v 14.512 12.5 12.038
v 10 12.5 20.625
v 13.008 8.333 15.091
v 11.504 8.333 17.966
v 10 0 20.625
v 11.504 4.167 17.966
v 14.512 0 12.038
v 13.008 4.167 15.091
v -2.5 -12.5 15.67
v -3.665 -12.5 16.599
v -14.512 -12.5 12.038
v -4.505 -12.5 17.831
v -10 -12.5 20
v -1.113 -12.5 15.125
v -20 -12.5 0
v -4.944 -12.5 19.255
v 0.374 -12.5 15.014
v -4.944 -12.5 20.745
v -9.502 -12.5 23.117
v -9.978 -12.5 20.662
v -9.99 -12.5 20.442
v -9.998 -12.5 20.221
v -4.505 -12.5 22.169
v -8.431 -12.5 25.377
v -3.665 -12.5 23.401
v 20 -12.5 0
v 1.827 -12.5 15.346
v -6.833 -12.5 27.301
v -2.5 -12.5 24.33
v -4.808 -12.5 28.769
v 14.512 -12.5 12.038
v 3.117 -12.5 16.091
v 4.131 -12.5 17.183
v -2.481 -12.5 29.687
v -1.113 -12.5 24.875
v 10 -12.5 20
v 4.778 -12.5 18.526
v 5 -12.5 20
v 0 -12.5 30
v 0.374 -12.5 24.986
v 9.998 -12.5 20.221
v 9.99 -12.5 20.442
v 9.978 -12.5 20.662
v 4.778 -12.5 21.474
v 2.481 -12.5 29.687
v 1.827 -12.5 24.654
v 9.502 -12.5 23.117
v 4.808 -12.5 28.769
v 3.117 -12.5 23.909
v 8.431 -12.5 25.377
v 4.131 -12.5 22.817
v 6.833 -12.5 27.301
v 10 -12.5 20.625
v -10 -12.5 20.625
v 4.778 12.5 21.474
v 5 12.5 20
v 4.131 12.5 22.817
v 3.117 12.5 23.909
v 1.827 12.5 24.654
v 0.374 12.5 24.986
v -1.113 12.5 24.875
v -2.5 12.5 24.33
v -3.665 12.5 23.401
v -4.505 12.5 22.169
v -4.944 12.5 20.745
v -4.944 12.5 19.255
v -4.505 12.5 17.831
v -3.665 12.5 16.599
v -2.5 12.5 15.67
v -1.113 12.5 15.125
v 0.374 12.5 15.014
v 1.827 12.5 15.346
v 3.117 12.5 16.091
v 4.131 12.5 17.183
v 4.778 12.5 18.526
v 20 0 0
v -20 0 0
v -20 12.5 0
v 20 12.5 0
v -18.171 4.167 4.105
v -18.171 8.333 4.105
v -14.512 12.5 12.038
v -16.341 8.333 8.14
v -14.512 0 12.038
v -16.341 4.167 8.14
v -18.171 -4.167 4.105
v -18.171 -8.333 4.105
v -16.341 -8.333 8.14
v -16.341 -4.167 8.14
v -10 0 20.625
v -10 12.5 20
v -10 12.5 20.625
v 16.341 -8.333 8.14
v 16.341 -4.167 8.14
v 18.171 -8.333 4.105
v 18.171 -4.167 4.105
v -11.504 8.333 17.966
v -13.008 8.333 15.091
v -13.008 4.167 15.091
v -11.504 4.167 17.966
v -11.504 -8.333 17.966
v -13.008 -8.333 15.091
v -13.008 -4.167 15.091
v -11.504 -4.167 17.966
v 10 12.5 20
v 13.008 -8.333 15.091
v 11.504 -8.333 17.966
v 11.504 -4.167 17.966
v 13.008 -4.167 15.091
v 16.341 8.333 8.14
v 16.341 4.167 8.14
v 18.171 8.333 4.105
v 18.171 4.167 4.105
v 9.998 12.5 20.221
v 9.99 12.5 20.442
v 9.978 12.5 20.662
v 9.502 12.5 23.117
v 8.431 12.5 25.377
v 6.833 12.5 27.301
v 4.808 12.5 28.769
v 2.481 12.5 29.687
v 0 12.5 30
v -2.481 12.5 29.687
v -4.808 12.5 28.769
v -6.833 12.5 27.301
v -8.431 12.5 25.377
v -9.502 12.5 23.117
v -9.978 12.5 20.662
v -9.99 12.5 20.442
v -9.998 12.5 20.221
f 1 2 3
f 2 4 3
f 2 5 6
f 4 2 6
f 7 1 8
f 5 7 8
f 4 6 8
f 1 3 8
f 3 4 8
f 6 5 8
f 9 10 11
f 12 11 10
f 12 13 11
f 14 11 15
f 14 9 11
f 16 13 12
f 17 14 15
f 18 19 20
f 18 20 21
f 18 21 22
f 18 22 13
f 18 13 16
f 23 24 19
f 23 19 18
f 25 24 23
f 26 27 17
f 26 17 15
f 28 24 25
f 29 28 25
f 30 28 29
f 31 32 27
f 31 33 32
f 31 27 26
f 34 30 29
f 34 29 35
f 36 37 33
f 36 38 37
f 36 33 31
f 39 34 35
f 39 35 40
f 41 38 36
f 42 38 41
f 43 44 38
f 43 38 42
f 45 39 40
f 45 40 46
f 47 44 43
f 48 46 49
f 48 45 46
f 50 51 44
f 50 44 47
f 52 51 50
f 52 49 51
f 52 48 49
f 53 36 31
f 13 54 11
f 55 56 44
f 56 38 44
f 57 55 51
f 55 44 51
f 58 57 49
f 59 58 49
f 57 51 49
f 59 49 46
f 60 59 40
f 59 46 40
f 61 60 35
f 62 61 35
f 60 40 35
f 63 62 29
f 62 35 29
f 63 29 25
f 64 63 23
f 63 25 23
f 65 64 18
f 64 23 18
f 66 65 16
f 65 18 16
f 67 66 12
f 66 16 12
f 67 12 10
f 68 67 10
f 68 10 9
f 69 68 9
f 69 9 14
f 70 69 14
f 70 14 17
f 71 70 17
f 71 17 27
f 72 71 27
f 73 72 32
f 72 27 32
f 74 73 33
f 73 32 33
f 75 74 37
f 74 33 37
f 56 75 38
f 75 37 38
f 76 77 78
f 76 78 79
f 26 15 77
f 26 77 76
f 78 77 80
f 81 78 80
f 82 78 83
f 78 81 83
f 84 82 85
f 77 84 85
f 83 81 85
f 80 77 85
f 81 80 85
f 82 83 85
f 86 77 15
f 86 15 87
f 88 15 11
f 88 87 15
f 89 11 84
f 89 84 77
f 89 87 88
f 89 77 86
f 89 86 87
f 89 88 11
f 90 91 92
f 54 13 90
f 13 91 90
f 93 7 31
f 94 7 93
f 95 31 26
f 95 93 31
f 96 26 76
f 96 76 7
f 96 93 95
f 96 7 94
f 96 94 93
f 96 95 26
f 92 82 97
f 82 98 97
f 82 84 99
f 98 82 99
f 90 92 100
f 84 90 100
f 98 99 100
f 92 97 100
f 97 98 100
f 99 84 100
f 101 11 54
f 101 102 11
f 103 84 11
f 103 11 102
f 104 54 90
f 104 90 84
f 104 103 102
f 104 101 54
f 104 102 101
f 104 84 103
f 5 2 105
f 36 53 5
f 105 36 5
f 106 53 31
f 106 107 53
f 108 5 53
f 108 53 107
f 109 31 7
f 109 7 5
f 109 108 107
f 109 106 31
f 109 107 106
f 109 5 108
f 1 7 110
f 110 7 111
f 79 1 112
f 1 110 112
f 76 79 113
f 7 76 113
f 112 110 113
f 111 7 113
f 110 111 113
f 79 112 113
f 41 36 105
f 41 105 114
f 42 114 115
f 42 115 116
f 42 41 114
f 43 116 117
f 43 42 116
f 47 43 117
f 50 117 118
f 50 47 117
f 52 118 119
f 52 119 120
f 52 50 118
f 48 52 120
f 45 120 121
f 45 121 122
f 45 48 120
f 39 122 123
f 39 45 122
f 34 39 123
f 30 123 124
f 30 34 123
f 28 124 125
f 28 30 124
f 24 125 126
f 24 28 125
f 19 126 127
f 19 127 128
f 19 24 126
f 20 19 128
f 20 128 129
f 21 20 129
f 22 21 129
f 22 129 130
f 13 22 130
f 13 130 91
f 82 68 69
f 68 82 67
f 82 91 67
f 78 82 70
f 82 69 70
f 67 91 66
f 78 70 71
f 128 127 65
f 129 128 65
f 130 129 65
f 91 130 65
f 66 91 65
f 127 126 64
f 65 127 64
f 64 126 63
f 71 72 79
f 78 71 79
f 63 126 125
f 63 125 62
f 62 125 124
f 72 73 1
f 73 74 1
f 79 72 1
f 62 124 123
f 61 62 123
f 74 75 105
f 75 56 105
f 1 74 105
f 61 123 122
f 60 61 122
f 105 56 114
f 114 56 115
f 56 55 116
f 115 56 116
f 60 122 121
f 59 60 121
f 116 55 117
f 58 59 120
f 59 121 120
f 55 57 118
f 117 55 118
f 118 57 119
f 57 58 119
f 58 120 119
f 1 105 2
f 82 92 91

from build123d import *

# Parameters (mm, degrees)
F2_DEPTH = 12.5
F0_R     = 5
F3_DEPTH = 12.5


with BuildPart() as f2:
    # F1 (on Front) → F2 (new body, symmetric)
    with BuildSketch(Plane.XZ):
        with BuildLine():
            Line((-10, 0), (10, 0))
            Line((10, 0), (10, 12.0382448658))
            Line((10, 12.0382448658), (6.0506574175, 12.0382448658))
            ThreePointArc((6.0506574175, 12.0382448658), (0, 10), (-6.0506574175, 12.0382448658))
            Line((-6.0506574175, 12.0382448658), (-10, 12.0382448658))
            Line((-10, 12.0382448658), (-10, 0))
        make_face()
        with BuildLine():
            Line((10, 12.0382448658), (10, 0))
            Line((10, 0), (20, 0))
            add(Edge.make_bspline(
                [(14.5119228257, 12.0382448658), (16.3412818838, 8.2321157615), (18.1706409419, 4.1160578807), (20, 0)],
                knots=[0.8627980706, 0.8627980706, 0.8627980706, 0.8627980706, 1, 1, 1, 1], degree=3))
            Line((14.5119228257, 12.0382448658), (10, 12.0382448658))
        make_face()
        with BuildLine():
            Line((-20, 0), (-10, 0))
            Line((-10, 0), (-10, 12.0382448658))
            Line((-10, 12.0382448658), (-14.5119228257, 12.0382448658))
            add(Edge.make_bspline(
                [(-20, 0), (-18.1706409419, 4.1160578807), (-16.3412818838, 8.2321157615), (-14.5119228257, 12.0382448658)],
                knots=[0, 0, 0, 0, 0.1372019294, 0.1372019294, 0.1372019294, 0.1372019294], degree=3))
        make_face()
        with BuildLine():
            Line((6.0506574175, 12.0382448658), (10, 12.0382448658))
            Line((10, 12.0382448658), (10, 20))
            ThreePointArc((10, 20), (8.958419899, 15.556272633), (6.0506574175, 12.0382448658))
        make_face()
        with BuildLine():
            Line((10, 20), (10, 12.0382448658))
            Line((10, 12.0382448658), (14.5119228257, 12.0382448658))
            add(Edge.make_bspline(
                [(10, 20.625), (11.5039742752, 18.0870434106), (13.0079485504, 15.1673846789), (14.5119228257, 12.0382448658)],
                knots=[0.75, 0.75, 0.75, 0.75, 0.8627980706, 0.8627980706, 0.8627980706, 0.8627980706], degree=3))
            Line((10, 20.625), (10, 20))
        make_face()
        with BuildLine():
            Line((-14.5119228257, 12.0382448658), (-10, 12.0382448658))
            Line((-10, 12.0382448658), (-10, 20))
            Line((-10, 20), (-10, 20.625))
            add(Edge.make_bspline(
                [(-14.5119228257, 12.0382448658), (-13.0079485504, 15.1673846789), (-11.5039742752, 18.0870434106), (-10, 20.625)],
                knots=[0.1372019294, 0.1372019294, 0.1372019294, 0.1372019294, 0.25, 0.25, 0.25, 0.25], degree=3))
        make_face()
        with BuildLine():
            Line((-10, 20), (-10, 12.0382448658))
            Line((-10, 12.0382448658), (-6.0506574175, 12.0382448658))
            ThreePointArc((-6.0506574175, 12.0382448658), (-8.958419899, 15.556272633), (-10, 20))
        make_face()
        with BuildLine():
            ThreePointArc((6.0506574175, 12.0382448658), (8.958419899, 15.556272633), (10, 20))
            ThreePointArc((10, 20), (9.9945146107, 20.3311762316), (9.9780644607, 20.661989137))
            add(Edge.make_bspline(
                [(0, 30), (3.3260214869, 30), (6.6520429738, 26.2664336107), (9.9780644607, 20.661989137)],
                knots=[0.5, 0.5, 0.5, 0.5, 0.7494516115, 0.7494516115, 0.7494516115, 0.7494516115], degree=3))
            add(Edge.make_bspline(
                [(-9.9780644607, 20.661989137), (-6.6520429738, 26.2664336107), (-3.3260214869, 30), (0, 30)],
                knots=[0.2505483885, 0.2505483885, 0.2505483885, 0.2505483885, 0.5, 0.5, 0.5, 0.5], degree=3))
            ThreePointArc((-9.9780644607, 20.661989137), (-9.9945146107, 20.3311762316), (-10, 20))
            ThreePointArc((-10, 20), (-8.958419899, 15.556272633), (-6.0506574175, 12.0382448658))
            Line((-6.0506574175, 12.0382448658), (6.0506574175, 12.0382448658))
        make_face()
        with BuildLine():
            ThreePointArc((-6.0506574175, 12.0382448658), (0, 10), (6.0506574175, 12.0382448658))
            Line((6.0506574175, 12.0382448658), (-6.0506574175, 12.0382448658))
        make_face()
        with BuildLine():
            add(Edge.make_bspline(
                [(0, 30), (3.3260214869, 30), (6.6520429738, 26.2664336107), (9.9780644607, 20.661989137)],
                knots=[0.5, 0.5, 0.5, 0.5, 0.7494516115, 0.7494516115, 0.7494516115, 0.7494516115], degree=3))
            ThreePointArc((9.9780644607, 20.661989137), (6.8330120968, 27.301366015), (0, 30))
        make_face()
        with BuildLine():
            ThreePointArc((0, 30), (-6.8330120968, 27.301366015), (-9.9780644607, 20.661989137))
            add(Edge.make_bspline(
                [(-9.9780644607, 20.661989137), (-6.6520429738, 26.2664336107), (-3.3260214869, 30), (0, 30)],
                knots=[0.2505483885, 0.2505483885, 0.2505483885, 0.2505483885, 0.5, 0.5, 0.5, 0.5], degree=3))
        make_face()
    extrude(amount=F2_DEPTH, both=True)

    # F0 (on Front) → F3 (cut, symmetric)
    with BuildSketch(Plane.XZ):
        with Locations((0, 20)):
            Circle(F0_R)
    extrude(amount=F3_DEPTH, both=True, mode=Mode.SUBTRACT)


solid = f2.part
